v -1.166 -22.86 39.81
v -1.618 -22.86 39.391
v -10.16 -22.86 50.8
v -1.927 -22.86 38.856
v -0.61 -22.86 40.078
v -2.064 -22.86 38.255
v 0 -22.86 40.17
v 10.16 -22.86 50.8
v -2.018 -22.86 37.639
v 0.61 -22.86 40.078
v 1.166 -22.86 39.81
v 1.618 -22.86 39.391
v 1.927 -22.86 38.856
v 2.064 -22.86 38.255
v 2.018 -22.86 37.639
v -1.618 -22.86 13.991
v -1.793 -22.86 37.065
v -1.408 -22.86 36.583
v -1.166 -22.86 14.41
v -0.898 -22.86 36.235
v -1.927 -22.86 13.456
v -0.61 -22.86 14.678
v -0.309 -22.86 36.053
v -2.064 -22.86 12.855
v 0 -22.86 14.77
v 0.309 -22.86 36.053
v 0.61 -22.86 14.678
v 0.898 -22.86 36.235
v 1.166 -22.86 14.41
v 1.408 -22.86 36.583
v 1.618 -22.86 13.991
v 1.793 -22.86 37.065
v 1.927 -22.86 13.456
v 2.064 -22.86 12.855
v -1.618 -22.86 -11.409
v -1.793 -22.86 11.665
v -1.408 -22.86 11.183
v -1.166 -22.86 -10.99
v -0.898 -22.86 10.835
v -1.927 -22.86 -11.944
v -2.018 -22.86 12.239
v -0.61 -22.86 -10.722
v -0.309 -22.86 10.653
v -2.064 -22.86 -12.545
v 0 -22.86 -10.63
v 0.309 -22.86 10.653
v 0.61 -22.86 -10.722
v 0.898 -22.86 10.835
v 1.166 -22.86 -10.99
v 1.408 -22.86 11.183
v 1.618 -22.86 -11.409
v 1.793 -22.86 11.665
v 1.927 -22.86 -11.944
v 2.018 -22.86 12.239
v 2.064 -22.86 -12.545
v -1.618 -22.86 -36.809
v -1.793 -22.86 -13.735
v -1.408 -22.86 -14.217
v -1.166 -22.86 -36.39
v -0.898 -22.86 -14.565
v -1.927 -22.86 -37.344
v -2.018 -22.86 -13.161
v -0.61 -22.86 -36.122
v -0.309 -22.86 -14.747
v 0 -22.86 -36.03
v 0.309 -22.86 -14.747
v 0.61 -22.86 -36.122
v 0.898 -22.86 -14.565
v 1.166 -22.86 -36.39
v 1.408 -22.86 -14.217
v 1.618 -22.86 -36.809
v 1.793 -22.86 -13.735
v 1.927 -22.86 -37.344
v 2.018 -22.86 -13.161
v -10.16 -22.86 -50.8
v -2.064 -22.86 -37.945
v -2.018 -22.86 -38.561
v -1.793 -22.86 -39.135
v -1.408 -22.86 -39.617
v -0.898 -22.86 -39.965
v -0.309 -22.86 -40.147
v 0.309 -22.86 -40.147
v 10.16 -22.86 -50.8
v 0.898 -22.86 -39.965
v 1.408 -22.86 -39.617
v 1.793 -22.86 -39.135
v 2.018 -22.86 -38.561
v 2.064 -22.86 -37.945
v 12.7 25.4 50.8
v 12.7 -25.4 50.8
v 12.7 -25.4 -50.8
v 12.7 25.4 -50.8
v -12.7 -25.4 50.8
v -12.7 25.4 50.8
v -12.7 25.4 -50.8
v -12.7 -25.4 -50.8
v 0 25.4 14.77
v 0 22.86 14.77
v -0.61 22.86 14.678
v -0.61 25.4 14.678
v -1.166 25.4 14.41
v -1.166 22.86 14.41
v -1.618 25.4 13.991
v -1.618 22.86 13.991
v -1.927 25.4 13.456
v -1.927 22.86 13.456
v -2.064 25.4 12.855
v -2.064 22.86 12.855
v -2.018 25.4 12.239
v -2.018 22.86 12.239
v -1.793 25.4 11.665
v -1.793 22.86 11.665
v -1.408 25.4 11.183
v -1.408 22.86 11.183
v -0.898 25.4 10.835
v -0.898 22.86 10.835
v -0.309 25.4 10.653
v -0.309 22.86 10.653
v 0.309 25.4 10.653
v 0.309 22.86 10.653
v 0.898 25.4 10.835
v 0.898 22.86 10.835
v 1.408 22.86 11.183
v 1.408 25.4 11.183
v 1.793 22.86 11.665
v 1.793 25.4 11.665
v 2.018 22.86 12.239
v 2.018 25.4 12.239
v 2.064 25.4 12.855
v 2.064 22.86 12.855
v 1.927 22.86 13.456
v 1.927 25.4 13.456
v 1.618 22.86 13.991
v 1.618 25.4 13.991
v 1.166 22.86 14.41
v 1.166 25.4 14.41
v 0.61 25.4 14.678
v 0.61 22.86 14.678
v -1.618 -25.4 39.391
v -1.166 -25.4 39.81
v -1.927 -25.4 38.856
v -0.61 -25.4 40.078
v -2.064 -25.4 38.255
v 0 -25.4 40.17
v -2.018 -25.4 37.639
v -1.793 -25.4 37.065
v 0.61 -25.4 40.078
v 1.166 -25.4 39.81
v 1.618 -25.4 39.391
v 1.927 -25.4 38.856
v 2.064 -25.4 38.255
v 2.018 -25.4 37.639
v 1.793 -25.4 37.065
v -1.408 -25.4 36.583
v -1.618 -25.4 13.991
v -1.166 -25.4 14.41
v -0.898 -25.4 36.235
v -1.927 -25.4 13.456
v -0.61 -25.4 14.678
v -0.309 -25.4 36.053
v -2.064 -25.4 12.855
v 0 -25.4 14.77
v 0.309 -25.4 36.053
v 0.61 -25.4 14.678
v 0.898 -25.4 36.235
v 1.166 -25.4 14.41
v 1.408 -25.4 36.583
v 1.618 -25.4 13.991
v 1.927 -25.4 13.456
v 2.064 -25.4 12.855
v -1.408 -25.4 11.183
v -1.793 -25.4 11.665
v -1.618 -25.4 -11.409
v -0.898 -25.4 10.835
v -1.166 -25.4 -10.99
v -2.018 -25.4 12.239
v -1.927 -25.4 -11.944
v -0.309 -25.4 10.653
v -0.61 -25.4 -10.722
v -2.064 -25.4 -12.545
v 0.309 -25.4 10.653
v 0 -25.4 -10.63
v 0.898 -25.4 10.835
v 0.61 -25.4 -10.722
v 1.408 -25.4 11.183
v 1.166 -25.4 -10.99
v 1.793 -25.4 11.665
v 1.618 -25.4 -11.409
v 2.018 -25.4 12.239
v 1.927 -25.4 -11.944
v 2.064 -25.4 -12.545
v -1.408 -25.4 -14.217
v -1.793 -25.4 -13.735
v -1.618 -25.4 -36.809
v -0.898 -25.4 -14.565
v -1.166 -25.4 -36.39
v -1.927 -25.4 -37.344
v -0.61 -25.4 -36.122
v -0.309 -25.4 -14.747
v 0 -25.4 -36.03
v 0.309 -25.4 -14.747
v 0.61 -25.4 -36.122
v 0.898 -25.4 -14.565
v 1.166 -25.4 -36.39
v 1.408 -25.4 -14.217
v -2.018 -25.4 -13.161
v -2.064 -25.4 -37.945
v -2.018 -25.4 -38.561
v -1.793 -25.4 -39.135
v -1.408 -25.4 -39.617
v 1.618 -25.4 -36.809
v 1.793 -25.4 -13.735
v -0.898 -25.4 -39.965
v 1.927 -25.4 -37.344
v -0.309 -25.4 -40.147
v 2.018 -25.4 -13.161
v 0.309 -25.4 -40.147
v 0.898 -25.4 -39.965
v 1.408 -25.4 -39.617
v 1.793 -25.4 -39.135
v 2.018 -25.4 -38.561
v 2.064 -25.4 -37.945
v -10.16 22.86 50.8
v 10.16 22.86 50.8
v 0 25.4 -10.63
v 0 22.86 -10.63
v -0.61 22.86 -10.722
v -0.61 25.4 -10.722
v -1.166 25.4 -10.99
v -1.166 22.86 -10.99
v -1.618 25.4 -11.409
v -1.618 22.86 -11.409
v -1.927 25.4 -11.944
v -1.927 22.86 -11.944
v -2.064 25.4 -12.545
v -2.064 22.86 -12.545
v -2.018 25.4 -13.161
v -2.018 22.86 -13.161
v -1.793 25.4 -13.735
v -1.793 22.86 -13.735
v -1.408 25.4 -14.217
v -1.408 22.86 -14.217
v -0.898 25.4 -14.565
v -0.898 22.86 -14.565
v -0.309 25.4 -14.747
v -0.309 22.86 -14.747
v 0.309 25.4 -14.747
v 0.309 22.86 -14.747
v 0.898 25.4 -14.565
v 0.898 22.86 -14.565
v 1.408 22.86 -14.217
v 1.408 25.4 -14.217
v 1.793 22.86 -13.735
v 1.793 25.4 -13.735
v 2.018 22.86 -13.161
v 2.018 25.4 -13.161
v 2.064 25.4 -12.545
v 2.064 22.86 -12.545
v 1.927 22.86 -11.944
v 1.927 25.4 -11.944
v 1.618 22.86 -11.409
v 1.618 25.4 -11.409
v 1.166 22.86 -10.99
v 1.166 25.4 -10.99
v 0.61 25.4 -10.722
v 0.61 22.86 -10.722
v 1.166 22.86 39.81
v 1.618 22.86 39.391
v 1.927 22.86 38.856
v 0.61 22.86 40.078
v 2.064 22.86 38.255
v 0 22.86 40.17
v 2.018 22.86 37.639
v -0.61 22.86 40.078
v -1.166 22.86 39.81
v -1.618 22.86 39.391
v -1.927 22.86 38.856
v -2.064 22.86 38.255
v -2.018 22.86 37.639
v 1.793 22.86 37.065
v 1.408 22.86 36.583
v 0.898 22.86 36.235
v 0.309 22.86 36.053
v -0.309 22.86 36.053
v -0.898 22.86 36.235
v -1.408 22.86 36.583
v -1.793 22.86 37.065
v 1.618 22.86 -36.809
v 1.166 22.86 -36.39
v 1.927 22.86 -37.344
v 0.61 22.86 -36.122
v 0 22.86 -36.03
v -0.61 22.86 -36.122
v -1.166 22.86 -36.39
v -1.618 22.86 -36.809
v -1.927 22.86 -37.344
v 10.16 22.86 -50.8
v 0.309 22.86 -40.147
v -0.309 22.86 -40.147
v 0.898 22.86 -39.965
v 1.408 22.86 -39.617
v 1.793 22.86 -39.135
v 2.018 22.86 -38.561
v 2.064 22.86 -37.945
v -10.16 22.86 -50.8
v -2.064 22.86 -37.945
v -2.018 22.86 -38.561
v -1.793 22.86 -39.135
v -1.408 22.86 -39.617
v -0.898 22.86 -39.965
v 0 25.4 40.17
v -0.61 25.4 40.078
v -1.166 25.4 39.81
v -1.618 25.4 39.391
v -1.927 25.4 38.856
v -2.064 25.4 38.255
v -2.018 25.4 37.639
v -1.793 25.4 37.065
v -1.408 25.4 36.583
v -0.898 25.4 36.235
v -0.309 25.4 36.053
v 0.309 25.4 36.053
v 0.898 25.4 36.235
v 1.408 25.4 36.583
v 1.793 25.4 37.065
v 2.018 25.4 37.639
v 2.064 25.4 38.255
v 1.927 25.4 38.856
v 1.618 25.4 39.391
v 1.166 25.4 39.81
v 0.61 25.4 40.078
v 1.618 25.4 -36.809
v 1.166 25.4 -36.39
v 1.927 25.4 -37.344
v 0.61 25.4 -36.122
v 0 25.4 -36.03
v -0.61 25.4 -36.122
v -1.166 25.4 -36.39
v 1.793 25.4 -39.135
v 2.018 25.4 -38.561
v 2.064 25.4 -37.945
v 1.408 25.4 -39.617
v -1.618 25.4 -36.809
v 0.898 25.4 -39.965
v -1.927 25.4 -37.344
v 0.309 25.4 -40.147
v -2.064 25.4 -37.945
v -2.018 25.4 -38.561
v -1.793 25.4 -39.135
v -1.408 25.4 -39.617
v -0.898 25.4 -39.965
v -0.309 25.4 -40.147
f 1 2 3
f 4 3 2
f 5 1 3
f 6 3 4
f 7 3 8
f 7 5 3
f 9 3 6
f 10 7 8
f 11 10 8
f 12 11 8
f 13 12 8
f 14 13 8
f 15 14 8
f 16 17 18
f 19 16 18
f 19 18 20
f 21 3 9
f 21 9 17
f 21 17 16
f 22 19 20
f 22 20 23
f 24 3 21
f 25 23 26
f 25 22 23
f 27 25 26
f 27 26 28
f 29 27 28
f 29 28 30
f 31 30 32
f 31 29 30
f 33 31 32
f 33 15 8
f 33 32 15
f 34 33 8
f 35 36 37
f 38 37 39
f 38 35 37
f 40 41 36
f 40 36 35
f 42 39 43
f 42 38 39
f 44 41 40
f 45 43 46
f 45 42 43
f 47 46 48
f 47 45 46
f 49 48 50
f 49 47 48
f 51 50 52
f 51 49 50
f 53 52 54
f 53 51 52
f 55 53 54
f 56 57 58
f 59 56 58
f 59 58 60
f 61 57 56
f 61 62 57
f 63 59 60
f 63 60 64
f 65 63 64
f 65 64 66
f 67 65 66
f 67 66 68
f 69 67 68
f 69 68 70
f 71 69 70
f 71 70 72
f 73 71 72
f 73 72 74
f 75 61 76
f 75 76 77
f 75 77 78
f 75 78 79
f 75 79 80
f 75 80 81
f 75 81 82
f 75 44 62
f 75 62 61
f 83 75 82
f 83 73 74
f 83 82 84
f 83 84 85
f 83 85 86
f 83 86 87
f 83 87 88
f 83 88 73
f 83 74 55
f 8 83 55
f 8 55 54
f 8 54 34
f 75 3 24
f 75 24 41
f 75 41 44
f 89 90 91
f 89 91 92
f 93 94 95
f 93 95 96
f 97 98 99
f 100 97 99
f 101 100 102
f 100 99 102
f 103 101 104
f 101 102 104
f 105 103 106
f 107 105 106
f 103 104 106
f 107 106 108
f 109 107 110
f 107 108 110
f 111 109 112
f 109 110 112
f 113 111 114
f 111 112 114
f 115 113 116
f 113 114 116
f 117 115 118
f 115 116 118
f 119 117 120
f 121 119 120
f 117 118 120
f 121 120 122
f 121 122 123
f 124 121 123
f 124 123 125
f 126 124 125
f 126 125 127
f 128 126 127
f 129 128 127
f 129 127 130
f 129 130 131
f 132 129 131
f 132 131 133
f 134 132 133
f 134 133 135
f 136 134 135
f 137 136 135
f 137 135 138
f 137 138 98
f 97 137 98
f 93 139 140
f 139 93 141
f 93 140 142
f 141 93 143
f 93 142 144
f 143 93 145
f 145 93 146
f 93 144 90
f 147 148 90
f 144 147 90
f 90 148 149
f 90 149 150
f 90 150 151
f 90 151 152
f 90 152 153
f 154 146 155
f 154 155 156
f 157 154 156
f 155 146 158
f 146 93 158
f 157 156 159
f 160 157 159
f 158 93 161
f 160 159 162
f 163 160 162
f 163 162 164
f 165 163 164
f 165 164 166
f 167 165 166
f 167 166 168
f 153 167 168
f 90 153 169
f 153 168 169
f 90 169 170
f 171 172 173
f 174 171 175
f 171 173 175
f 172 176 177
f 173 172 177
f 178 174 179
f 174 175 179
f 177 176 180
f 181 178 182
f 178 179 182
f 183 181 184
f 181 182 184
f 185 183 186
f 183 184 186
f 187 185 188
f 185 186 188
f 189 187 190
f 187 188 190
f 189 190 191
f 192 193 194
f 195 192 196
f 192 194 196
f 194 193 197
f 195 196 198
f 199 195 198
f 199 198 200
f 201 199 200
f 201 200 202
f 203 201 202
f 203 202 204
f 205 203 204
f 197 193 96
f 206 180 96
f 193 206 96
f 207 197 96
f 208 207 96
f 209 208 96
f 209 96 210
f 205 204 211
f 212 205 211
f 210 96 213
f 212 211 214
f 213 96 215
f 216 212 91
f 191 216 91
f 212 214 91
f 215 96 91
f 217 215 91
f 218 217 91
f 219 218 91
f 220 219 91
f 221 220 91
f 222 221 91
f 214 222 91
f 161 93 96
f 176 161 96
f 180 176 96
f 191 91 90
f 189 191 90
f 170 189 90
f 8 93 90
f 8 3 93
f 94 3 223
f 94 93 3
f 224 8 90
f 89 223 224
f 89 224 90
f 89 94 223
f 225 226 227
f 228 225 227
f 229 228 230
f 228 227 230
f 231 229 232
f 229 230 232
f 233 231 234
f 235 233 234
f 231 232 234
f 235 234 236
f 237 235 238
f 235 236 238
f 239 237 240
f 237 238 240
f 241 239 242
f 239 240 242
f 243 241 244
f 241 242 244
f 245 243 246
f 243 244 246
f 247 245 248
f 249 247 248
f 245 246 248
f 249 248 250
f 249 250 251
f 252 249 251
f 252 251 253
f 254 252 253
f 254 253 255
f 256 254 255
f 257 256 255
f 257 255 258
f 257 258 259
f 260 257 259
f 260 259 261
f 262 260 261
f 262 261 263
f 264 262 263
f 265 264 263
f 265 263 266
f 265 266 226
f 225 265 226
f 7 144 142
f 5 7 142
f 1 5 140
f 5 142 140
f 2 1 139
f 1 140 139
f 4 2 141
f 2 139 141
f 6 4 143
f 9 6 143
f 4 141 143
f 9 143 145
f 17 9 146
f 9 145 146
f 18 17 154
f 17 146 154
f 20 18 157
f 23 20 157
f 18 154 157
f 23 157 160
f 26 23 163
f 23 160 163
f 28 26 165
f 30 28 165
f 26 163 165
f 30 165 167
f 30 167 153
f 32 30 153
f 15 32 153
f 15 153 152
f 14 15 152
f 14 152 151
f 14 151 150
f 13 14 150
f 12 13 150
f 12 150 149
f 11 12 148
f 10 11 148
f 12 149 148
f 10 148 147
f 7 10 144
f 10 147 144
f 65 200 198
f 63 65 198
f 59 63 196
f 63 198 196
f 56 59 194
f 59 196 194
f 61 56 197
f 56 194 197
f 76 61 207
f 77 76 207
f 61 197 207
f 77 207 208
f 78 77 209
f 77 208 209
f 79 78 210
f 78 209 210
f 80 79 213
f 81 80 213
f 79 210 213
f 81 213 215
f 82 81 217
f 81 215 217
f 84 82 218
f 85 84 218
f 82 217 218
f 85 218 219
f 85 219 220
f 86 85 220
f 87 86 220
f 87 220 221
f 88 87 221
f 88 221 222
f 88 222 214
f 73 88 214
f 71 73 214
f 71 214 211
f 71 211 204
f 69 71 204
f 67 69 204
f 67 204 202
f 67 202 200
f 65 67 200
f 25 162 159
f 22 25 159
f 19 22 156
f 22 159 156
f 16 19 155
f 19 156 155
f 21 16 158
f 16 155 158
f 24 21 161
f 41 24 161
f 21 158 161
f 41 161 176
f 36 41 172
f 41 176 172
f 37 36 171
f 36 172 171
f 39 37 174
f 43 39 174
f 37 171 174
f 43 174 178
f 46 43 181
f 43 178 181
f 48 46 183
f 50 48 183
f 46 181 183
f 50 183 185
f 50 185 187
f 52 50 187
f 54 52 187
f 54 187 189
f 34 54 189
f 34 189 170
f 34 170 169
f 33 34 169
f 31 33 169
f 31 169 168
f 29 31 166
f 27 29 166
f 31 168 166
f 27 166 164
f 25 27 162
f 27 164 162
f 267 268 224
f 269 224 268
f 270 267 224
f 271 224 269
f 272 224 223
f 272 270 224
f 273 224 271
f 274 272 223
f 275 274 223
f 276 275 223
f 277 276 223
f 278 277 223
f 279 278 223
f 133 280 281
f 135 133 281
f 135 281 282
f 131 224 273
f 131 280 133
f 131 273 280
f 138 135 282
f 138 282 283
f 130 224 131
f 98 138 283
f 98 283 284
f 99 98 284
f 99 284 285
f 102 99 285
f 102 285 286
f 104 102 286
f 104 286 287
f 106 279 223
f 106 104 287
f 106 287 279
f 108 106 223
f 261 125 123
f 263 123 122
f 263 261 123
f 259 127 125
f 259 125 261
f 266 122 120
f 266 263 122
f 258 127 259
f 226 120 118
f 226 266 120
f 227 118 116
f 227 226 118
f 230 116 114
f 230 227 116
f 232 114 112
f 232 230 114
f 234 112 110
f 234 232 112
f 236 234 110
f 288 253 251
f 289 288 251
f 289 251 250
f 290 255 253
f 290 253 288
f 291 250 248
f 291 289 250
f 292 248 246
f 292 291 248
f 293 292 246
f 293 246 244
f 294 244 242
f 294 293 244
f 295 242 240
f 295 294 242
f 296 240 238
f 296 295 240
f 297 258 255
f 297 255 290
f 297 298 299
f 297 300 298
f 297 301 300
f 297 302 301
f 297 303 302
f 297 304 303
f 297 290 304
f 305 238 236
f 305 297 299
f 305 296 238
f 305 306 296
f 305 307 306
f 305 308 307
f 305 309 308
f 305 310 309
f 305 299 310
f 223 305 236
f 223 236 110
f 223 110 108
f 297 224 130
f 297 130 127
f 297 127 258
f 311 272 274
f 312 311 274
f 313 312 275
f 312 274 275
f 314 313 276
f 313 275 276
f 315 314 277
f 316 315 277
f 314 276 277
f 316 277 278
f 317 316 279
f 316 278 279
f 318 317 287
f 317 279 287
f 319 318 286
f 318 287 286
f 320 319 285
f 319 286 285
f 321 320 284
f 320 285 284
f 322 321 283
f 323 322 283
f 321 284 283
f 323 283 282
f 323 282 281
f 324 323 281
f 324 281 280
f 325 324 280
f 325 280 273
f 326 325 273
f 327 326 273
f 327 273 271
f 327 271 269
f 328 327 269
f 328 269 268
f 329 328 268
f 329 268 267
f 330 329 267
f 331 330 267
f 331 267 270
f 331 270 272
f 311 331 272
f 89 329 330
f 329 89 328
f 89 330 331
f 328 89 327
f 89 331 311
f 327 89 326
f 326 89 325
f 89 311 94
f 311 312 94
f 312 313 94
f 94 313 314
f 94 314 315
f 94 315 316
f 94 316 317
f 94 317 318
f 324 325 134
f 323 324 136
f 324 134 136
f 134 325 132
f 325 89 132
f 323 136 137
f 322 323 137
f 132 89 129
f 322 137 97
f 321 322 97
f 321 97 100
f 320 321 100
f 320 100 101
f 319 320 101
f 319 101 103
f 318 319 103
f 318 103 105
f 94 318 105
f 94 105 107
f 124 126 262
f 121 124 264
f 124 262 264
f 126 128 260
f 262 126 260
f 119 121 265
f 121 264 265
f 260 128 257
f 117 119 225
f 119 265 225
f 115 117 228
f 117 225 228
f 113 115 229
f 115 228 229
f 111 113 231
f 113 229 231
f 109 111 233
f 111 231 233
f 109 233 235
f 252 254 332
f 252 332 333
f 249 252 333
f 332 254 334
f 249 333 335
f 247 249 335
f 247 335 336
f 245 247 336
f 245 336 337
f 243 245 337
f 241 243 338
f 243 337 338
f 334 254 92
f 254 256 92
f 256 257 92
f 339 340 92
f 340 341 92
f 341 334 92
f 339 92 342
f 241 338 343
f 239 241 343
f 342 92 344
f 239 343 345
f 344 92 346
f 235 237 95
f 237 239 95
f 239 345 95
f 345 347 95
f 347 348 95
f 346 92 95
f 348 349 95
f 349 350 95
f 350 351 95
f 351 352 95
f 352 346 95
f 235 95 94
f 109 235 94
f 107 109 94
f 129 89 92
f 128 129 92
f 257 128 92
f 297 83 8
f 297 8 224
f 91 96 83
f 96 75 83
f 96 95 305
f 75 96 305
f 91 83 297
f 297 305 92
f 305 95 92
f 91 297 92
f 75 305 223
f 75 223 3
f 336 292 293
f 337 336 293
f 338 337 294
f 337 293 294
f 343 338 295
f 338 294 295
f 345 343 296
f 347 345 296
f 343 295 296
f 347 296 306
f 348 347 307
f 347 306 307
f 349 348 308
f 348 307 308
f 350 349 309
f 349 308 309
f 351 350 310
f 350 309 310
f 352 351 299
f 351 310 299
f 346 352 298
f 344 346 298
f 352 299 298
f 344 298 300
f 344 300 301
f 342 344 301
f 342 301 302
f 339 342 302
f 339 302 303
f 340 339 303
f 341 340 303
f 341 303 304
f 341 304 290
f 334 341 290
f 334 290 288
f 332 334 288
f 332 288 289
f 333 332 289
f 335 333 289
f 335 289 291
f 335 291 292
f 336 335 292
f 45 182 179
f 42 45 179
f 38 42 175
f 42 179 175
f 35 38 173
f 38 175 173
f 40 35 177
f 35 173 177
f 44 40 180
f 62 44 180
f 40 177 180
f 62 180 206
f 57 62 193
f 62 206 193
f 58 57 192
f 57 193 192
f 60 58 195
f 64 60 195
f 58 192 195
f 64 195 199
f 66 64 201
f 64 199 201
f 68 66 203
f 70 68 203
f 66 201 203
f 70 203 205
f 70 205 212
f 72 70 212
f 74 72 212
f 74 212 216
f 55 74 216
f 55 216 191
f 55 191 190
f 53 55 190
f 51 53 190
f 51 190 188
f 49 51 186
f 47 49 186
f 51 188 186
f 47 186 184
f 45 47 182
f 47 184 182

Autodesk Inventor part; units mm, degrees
ref_plane "YZ Plane" through (0, 0, 0) normal (1, 0, 0) x (0, 1, 0)
ref_plane "XZ Plane" through (0, 0, 0) normal (0, 1, 0) x (-1, 0, 0)
ref_plane "XY Plane" through (0, 0, 0) normal (0, 0, 1) x (1, 0, 0)
sketch "Sketch1" plane through (0, 0, 0) normal (0, 0, 1) x (1, 0, 0)
  line L0 (-12.7, -25.4) -> (12.7, -25.4)
  line L1 (12.7, -25.4) -> (12.7, 25.4)
  line L2 (12.7, 25.4) -> (-12.7, 25.4)
  line L3 (-12.7, 25.4) -> (-12.7, -25.4)
  line L4 (-12.7, -25.4) -> (12.7, 25.4) construction
  line L5 (12.7, -25.4) -> (-12.7, 25.4) construction
  line L6 (-10.16, -22.86) -> (10.16, -22.86)
  line L7 (10.16, -22.86) -> (10.16, 22.86)
  line L8 (10.16, 22.86) -> (-10.16, 22.86)
  line L9 (-10.16, 22.86) -> (-10.16, -22.86)
  line L10 (-10.16, -22.86) -> (10.16, 22.86) construction
  line L11 (10.16, -22.86) -> (-10.16, 22.86) construction
  point P0 (0, 0)
  dimension "d0" = 25.4
  dimension "d1" = 50.8
  dimension "d2" = 20.32
  dimension "d3" = 45.72
extrude "Extrusion1" add sketch "Sketch1" along normal mid plane 101.6
sketch "Sketch2" plane through (-12.7, 25.4, 50.8) normal (0, 1, 0) x (1, 0, 0)
  line L0 (25.4, 101.6) -> (25.4, 0) projected
  line L1 (25.4, 0) -> (0, 0) projected
  point P0 (12.7, 50.8)
  point P1 (12.7, 12.7)
  dimension "d6" = 12.7
  dimension "d7" = 12.7
hole "Hole1" at (0, 25.4, 38.1) direction (0, -1, 0) diameter 4.1402 end through all
pattern_linear "Rectangular Pattern1" count 4 spacing 25.4 along (0, 0, -1) of "Hole1"
properties part number "Drivetrain_short_front"
